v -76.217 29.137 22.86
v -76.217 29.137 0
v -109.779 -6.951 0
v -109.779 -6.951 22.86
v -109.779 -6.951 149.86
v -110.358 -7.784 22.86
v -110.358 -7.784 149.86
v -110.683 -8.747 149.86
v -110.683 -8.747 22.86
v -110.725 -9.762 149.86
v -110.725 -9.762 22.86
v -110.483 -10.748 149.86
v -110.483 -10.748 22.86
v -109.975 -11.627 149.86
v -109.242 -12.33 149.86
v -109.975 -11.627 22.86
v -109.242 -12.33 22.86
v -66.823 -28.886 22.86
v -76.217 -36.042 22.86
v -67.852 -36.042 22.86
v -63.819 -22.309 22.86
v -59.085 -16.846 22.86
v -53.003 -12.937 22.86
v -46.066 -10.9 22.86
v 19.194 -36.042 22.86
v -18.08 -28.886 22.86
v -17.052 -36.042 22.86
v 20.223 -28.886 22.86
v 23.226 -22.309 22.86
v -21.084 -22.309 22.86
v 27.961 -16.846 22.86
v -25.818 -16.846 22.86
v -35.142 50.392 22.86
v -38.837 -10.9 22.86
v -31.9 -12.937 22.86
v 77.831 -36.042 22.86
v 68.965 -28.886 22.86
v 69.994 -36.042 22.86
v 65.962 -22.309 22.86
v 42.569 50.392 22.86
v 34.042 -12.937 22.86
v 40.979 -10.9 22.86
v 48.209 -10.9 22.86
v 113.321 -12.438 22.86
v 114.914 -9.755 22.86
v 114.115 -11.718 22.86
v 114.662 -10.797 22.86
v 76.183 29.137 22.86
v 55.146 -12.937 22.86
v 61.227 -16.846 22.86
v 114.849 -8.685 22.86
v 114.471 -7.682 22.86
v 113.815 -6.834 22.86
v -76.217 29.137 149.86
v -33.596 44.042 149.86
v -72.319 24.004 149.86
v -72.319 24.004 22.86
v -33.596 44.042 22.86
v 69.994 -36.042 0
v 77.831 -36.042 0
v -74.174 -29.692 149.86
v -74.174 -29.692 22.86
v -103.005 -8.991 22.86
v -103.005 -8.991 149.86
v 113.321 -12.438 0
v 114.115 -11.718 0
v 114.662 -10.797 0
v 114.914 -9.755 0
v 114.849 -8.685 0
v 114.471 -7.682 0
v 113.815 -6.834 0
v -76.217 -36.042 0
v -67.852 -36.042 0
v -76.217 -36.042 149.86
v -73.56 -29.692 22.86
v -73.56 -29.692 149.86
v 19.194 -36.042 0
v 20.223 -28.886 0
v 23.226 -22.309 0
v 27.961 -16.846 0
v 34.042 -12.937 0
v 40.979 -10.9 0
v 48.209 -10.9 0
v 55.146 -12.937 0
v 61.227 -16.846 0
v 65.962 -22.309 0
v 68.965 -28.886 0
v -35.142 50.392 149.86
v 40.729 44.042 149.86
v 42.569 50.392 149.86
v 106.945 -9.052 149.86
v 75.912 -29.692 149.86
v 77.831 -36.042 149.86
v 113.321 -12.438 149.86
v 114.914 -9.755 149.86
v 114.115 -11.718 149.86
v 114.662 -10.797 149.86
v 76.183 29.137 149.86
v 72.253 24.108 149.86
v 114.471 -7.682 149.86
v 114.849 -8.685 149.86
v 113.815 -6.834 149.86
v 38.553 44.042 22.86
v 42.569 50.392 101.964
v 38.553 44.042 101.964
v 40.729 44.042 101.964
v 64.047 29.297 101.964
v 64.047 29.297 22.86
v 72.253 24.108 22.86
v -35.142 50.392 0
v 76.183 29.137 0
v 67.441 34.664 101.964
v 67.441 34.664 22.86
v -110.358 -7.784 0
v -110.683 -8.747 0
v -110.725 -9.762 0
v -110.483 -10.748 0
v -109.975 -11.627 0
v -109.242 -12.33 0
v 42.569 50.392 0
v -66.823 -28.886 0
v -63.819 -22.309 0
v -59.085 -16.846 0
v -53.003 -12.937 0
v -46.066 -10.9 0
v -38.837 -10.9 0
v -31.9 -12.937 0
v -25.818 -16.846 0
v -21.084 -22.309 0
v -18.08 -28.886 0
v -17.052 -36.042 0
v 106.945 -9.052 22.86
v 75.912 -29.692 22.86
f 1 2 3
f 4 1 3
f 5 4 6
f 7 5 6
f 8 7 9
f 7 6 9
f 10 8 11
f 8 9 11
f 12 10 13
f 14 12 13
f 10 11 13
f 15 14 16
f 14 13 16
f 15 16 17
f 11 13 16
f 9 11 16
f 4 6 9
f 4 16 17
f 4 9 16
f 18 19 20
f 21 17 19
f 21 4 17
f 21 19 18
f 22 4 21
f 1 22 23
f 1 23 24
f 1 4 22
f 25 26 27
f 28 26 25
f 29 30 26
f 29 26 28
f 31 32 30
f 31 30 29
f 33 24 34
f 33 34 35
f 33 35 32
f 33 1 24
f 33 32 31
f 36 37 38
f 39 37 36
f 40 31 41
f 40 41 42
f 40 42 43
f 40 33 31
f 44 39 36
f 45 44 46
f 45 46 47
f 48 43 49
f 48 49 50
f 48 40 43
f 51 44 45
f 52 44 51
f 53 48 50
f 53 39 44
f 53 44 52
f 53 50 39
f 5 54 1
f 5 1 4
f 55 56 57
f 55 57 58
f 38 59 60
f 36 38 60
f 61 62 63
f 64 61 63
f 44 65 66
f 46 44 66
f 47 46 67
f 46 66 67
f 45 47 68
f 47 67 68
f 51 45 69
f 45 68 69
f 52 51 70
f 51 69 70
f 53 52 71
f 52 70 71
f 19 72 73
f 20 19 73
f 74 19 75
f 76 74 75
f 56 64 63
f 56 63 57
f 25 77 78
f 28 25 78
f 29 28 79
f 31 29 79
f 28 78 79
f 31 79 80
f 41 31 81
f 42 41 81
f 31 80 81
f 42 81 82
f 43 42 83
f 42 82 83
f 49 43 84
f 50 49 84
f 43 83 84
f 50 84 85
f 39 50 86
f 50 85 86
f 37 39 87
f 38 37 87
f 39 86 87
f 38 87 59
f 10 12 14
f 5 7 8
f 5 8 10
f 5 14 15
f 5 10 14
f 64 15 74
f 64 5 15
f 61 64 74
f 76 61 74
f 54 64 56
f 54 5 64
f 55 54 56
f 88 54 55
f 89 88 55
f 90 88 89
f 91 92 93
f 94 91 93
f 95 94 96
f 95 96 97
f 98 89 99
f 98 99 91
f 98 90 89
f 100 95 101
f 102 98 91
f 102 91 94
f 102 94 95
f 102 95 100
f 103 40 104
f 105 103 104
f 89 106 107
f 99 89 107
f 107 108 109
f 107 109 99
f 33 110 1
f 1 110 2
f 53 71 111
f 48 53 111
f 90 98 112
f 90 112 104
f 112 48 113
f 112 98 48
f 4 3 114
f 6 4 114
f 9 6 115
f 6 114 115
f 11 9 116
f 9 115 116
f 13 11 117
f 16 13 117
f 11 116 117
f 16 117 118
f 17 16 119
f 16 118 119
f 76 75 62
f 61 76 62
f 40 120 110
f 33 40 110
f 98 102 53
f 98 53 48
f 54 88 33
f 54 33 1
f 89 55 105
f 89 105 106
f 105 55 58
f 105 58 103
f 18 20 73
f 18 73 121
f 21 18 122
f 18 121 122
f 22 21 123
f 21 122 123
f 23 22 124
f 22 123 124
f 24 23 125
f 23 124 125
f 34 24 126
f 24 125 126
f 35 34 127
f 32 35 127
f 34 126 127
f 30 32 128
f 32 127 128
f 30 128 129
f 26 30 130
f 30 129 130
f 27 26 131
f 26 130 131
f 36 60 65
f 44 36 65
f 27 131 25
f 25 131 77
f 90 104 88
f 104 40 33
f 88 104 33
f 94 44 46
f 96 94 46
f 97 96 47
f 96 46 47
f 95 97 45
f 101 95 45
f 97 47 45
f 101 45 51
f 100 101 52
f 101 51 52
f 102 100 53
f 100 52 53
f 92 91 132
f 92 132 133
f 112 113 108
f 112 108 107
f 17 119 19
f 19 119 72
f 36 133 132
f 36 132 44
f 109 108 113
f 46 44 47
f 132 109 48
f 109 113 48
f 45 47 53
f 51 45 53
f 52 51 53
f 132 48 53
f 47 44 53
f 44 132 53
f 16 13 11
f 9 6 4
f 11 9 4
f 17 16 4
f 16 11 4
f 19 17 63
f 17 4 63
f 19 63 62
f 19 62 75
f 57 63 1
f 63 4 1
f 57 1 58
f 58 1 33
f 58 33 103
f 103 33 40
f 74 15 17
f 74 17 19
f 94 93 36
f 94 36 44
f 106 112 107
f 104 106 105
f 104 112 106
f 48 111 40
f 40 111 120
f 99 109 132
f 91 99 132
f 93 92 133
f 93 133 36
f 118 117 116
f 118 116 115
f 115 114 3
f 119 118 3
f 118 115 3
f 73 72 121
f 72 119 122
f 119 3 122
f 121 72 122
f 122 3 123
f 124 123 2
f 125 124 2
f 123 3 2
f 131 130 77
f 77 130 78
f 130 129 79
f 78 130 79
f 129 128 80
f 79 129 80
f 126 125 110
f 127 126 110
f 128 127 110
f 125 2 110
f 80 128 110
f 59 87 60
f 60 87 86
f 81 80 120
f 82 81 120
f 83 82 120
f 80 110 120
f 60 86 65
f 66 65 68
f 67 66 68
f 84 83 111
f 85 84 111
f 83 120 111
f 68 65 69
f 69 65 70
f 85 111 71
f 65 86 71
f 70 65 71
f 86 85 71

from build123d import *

# Parameters (mm, degrees)
F1_DEPTH = 22.86
F3_DEPTH = 127
F4_W     = 29.427899497
F4_H     = 79.1037733698
F5_DEPTH = 25.4


with BuildPart() as f1:
    # F0 (on Top) → F1 (new body)
    with BuildSketch(Plane.XY):
        with BuildLine():
            Line((-109.2416586881, -12.3302117755), (-76.2172043324, -36.0417403281))
            Line((-76.2172043324, -36.0417403281), (-67.8515716732, -36.0417403281))
            ThreePointArc((-67.8515716732, -36.0417403281), (-42.4515716732, -10.6417403281), (-17.0515716732, -36.0417403281))
            Line((-17.0515716732, -36.0417403281), (19.194001025, -36.0417403281))
            ThreePointArc((19.194001025, -36.0417403281), (44.594001025, -10.6417403281), (69.994001025, -36.0417403281))
            Line((69.994001025, -36.0417403281), (76.1827956676, -36.0417403281))
            Line((76.1827956676, -36.0417403281), (77.8310745955, -36.0417403281))
            Line((77.8310745955, -36.0417403281), (113.3208680851, -12.4382194949))
            ThreePointArc((113.3208680851, -12.4382194949), (114.9144029238, -9.7550934328), (113.8150775152, -6.8344766497))
            Line((113.8150775152, -6.8344766497), (76.1827956676, 29.1366521269))
            Line((76.1827956676, 29.1366521269), (42.5686240196, 50.392139703))
            Line((42.5686240196, 50.392139703), (-35.1417586207, 50.392139703))
            Line((-35.1417586207, 50.392139703), (-76.2172043324, 29.1366521269))
            Line((-76.2172043324, 29.1366521269), (-109.778551859, -6.9506209081))
            ThreePointArc((-109.778551859, -6.9506209081), (-110.725225663, -9.761687616), (-109.2416586881, -12.3302117755))
        make_face()
    extrude(amount=F1_DEPTH)


with BuildPart() as f3:
    # F2 (on face) → F3 (new body)
    with BuildSketch(Plane.XY.offset(22.86)):
        with BuildLine():
            Line((-76.2172043324, 29.1366521269), (-109.778551859, -6.9506209081))
            ThreePointArc((-109.778551859, -6.9506209081), (-110.725225663, -9.761687616), (-109.2416586881, -12.3302117755))
            Line((-109.2416586881, -12.3302117755), (-76.2172043324, -36.0417403281))
            Line((-76.2172043324, -36.0417403281), (-73.5600914065, -29.6917403281))
            Line((-73.5600914065, -29.6917403281), (-74.1736543222, -29.6917403281))
            Line((-74.1736543222, -29.6917403281), (-103.0045907292, -8.9911538944))
            Line((-103.0045907292, -8.9911538944), (-72.3187850065, 24.0041556216))
            Line((-72.3187850065, 24.0041556216), (-33.5961198895, 44.042139703))
            Line((-33.5961198895, 44.042139703), (40.7293845442, 44.042139703))
            Line((40.7293845442, 44.042139703), (72.2533122735, 24.1083908897))
            Line((72.2533122735, 24.1083908897), (106.9453496251, -9.0522807952))
            Line((106.9453496251, -9.0522807952), (75.9122608866, -29.6917403281))
            Line((75.9122608866, -29.6917403281), (77.8310745955, -36.0417403281))
            Line((77.8310745955, -36.0417403281), (113.3208680851, -12.4382194949))
            ThreePointArc((113.3208680851, -12.4382194949), (114.9144029238, -9.7550934328), (113.8150775152, -6.8344766497))
            Line((113.8150775152, -6.8344766497), (76.1827956676, 29.1366521269))
            Line((76.1827956676, 29.1366521269), (42.5686240196, 50.392139703))
            Line((42.5686240196, 50.392139703), (-35.1417586207, 50.392139703))
            Line((-35.1417586207, 50.392139703), (-76.2172043324, 29.1366521269))
        make_face()
    extrude(amount=F3_DEPTH)

    # F4 (on face) → F5 (cut)
    with BuildSketch(Plane(origin=(34.9222309204, 55.2272376856, 0), x_dir=(-0.8451994744, 0.5344509785, 0), z_dir=(0.5344509785, 0.8451994744, 0))):
        with Locations((-23.7608000252, 62.4118866849)):
            Rectangle(F4_W, F4_H)
    extrude(amount=-F5_DEPTH, mode=Mode.SUBTRACT)


solid = Compound([f1.part, f3.part])
